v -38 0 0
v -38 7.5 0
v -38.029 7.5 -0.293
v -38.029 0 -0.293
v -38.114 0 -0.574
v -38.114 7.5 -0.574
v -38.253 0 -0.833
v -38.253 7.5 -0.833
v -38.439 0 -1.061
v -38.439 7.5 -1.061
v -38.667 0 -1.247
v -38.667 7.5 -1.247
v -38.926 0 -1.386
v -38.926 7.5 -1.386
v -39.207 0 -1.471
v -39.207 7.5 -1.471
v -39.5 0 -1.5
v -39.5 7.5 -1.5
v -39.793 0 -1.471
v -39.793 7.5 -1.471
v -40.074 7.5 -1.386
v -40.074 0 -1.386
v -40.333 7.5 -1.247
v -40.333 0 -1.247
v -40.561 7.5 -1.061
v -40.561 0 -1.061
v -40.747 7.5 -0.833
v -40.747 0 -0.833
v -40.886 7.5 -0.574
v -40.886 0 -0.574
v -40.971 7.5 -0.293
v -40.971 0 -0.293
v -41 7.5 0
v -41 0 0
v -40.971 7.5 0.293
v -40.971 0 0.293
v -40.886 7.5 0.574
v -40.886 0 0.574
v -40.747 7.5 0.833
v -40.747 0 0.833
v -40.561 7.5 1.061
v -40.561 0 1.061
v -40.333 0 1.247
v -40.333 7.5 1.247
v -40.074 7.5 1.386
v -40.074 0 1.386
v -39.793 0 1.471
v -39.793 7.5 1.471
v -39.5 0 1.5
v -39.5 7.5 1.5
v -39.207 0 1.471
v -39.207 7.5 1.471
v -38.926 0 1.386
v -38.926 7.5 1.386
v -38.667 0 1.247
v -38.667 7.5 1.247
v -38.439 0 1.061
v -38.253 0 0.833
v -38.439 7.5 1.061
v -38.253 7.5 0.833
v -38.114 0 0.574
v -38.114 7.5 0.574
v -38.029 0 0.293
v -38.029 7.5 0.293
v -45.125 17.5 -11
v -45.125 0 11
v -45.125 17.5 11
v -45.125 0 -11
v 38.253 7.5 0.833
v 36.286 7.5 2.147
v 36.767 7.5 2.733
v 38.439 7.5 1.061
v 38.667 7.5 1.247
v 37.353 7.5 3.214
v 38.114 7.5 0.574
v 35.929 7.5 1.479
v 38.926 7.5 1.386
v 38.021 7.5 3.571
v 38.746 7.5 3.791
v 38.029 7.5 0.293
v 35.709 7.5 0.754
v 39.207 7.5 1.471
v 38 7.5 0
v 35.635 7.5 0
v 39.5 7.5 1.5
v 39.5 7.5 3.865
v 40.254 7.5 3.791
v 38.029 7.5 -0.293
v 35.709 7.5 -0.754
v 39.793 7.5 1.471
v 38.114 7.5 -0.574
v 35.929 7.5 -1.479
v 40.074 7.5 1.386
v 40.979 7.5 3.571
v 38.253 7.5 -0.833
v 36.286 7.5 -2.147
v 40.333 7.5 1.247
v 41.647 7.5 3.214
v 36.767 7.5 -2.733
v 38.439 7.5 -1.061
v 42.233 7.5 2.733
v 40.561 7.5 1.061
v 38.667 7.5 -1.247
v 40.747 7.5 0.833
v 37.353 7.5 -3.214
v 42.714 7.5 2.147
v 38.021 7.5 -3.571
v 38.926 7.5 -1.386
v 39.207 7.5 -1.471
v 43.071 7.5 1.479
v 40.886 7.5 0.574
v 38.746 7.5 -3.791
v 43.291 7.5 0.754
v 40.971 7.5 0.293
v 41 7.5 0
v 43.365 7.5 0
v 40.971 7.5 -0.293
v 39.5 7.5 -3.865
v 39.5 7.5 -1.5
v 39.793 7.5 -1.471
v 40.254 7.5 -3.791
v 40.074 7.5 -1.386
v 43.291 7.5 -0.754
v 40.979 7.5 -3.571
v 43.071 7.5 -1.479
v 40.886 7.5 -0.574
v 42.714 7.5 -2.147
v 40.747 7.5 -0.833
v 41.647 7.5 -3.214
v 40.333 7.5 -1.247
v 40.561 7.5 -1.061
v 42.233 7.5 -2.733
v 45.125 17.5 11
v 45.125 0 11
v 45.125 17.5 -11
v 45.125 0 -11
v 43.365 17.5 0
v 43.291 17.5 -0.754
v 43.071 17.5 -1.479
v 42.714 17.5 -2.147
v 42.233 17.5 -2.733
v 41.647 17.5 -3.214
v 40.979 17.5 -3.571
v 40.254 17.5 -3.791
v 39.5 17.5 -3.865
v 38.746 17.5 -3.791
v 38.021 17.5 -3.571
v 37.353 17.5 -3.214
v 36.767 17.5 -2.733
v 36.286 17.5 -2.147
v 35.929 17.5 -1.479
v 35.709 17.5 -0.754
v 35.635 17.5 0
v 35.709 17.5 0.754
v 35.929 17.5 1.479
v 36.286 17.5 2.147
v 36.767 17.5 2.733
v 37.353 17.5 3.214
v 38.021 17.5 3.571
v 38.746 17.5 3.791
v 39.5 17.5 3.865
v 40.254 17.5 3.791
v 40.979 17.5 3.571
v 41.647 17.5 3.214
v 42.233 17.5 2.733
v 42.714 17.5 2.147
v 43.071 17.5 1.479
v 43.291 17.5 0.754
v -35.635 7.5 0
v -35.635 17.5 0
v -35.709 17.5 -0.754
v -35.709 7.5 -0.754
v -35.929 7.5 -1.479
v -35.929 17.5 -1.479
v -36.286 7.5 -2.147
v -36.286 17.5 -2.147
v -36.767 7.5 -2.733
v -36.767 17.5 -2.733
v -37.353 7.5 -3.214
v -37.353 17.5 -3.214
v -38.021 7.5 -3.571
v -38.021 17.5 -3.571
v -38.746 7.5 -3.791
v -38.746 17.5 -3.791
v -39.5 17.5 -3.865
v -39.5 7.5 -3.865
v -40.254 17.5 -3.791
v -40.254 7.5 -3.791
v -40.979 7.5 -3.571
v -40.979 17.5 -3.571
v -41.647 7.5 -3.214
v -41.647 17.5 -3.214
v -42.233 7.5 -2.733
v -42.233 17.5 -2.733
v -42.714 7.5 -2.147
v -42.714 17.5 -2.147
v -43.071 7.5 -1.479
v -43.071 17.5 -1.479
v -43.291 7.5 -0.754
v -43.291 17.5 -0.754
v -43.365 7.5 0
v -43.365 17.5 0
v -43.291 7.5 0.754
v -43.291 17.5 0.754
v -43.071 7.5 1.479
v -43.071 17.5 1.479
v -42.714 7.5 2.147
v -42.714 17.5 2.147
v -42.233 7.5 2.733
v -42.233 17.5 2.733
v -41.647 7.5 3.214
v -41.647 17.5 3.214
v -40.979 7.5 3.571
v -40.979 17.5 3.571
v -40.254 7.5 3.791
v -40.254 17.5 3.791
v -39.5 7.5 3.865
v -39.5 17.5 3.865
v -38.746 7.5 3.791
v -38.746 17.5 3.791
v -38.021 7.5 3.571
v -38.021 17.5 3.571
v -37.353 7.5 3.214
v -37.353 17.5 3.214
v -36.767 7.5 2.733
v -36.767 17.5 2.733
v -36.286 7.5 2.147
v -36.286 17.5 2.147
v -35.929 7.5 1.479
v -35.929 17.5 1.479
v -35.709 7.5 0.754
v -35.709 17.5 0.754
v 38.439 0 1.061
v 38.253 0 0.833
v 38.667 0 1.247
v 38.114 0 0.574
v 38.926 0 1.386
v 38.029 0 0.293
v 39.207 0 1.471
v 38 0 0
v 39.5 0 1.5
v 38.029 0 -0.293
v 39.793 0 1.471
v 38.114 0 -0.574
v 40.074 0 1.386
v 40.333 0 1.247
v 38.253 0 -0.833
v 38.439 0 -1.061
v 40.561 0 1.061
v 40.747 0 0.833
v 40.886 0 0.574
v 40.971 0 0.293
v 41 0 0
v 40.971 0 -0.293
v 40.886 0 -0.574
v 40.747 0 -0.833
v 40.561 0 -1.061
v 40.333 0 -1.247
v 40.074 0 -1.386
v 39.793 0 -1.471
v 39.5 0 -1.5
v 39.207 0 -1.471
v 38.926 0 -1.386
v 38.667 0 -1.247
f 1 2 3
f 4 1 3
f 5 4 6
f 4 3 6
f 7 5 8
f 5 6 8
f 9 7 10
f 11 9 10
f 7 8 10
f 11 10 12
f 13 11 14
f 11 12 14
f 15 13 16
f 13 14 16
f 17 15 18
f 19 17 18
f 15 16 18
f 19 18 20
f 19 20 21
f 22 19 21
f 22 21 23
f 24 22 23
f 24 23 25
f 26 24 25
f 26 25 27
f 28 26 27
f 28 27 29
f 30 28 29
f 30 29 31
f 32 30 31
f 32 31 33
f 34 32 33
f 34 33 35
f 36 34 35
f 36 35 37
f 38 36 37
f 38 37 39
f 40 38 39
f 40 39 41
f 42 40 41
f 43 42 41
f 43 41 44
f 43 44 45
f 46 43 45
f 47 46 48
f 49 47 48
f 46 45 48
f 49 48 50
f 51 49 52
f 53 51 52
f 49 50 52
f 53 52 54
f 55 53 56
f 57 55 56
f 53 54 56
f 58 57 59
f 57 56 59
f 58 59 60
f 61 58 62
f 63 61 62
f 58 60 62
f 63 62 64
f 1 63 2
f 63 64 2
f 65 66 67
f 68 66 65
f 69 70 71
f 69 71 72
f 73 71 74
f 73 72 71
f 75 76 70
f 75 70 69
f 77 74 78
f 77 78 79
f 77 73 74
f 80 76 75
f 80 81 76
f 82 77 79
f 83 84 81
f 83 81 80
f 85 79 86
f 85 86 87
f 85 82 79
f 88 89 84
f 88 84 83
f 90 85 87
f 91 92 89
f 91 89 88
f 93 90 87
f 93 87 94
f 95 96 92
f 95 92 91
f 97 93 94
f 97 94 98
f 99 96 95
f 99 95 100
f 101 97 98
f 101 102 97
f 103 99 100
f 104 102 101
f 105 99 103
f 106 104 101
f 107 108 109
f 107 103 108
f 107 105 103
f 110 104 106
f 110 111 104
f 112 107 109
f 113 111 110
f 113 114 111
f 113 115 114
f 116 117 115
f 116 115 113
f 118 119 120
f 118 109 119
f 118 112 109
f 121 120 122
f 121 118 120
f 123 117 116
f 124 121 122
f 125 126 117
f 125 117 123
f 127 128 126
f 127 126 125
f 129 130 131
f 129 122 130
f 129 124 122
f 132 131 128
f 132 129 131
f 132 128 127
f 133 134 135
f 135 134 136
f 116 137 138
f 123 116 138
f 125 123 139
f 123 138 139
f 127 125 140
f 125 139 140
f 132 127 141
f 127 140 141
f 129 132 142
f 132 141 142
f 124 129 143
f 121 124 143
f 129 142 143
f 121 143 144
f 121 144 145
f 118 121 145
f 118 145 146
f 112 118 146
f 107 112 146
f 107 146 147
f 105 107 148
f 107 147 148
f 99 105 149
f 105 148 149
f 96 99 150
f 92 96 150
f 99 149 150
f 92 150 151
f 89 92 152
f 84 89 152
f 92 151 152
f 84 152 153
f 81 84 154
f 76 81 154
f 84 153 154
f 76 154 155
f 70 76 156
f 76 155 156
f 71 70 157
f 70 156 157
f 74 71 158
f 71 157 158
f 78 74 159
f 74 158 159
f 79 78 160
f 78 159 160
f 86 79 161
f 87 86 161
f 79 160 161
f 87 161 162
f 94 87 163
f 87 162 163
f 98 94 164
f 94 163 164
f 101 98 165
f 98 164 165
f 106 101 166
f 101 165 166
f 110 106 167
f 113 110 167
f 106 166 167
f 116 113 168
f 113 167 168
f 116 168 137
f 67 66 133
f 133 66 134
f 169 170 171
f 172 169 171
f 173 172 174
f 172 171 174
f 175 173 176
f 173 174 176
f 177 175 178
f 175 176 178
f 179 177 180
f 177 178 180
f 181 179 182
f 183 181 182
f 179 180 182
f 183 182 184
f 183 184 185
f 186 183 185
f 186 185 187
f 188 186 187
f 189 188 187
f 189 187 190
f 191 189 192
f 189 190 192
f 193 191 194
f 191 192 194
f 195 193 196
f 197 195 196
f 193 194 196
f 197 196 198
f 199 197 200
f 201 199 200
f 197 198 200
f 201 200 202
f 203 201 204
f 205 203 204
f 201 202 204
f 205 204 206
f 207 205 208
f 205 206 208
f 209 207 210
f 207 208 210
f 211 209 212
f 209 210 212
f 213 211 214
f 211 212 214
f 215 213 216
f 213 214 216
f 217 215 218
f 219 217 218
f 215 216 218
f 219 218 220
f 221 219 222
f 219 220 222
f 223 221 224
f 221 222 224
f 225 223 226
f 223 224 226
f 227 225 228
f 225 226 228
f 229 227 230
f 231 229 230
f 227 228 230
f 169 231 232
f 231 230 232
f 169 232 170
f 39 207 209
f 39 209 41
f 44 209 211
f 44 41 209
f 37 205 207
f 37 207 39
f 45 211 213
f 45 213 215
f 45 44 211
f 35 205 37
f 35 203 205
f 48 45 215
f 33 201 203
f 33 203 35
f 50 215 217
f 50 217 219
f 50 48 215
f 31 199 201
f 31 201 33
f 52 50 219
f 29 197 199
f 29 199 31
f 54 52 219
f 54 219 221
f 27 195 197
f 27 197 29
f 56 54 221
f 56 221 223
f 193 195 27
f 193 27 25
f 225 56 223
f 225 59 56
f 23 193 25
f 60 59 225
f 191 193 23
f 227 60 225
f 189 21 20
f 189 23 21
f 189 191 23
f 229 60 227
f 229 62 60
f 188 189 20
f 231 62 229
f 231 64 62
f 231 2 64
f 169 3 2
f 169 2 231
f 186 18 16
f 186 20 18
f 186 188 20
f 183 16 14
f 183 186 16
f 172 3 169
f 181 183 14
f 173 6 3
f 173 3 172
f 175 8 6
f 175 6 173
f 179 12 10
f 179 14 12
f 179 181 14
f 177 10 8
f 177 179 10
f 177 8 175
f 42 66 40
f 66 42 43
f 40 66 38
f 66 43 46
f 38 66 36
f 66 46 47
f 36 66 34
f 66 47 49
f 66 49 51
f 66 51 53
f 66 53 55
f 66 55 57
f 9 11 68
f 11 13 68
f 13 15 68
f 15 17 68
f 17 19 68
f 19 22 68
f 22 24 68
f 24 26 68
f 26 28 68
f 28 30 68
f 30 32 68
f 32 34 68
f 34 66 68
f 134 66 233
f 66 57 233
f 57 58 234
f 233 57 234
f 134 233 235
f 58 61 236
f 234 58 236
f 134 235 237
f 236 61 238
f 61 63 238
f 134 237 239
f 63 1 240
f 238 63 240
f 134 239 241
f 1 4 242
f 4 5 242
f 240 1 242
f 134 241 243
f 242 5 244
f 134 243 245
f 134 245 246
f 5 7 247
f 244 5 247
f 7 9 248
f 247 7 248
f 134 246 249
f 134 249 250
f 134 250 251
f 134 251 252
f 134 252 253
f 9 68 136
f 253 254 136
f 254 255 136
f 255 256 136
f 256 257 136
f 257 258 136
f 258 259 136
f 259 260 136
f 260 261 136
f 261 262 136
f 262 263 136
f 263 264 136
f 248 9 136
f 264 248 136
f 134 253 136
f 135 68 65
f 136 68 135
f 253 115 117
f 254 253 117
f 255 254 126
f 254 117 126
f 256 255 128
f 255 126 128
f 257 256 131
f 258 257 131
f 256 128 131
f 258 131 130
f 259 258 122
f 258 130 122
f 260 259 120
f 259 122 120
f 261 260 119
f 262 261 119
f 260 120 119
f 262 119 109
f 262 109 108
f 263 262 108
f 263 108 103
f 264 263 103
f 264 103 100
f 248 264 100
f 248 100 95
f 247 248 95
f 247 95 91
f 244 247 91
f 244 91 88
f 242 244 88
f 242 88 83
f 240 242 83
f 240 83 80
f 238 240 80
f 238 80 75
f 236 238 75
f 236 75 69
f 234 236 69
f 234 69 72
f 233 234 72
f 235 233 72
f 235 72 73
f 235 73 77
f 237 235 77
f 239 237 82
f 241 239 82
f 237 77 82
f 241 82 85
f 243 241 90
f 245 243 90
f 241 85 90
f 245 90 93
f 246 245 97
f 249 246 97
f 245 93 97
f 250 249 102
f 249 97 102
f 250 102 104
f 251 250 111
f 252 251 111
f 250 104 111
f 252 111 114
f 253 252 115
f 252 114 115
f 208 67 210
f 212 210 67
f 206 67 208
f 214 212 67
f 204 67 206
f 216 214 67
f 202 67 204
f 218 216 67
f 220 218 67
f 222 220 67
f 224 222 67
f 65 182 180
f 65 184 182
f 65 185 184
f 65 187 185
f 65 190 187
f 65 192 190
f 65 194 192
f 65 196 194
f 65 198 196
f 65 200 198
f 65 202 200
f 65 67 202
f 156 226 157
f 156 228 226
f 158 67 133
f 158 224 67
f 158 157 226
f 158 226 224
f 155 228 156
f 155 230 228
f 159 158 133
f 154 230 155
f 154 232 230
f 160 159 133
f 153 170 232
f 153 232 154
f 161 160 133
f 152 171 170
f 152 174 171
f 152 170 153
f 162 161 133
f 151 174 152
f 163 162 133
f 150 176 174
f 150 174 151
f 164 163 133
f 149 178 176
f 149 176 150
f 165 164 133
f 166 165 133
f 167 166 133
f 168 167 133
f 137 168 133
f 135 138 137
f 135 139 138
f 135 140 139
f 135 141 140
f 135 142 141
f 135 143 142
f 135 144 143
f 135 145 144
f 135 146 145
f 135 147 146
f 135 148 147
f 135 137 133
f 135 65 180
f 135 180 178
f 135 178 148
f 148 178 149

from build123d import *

# Parameters (mm, degrees)
SKETCH1_W               = 90.25
SKETCH1_H               = 22
BOSS_EXTRUDE1_DEPTH     = 17.5
SKETCH2_R               = 1.5
CUT_EXTRUDE1_DEPTH      = 1
CUT_EXTRUDE1_DEPTH_BACK = 18.5
SKETCH3_R               = 3.865
SKETCH3_R_2             = 1.5
CUT_EXTRUDE2_DEPTH      = 10


with BuildPart() as part:
    # Sketch1 → Boss-Extrude1 (new body)
    with BuildSketch(Plane(origin=(0, 0, 0), x_dir=(1, 0, 0), z_dir=(0, 1, 0))):
        Rectangle(SKETCH1_W, SKETCH1_H)
    extrude(amount=BOSS_EXTRUDE1_DEPTH)

    # Sketch2 → Cut-Extrude1 (cut, two sides)
    with BuildSketch(Plane(origin=(0, 17.5, 0), x_dir=(1, 0, 0), z_dir=(0, 1, 0))) as cut_extrude1_sk:
        with Locations((-39.5, 0)):
            Circle(SKETCH2_R)
        with Locations((39.5, 0)):
            Circle(SKETCH2_R)
    extrude(amount=CUT_EXTRUDE1_DEPTH, mode=Mode.SUBTRACT)
    extrude(cut_extrude1_sk.sketch, amount=-CUT_EXTRUDE1_DEPTH_BACK, mode=Mode.SUBTRACT)

    # Sketch3 → Cut-Extrude2 (cut)
    with BuildSketch(Plane(origin=(0, 17.5, 0), x_dir=(1, 0, 0), z_dir=(0, 1, 0))):
        with Locations((-39.5, 0)):
            Circle(SKETCH3_R)
        with Locations((-39.5, 0)):
            Circle(SKETCH3_R_2, mode=Mode.SUBTRACT)
        with Locations((39.5, 0)):
            Circle(SKETCH3_R)
        with Locations((39.5, 0)):
            Circle(SKETCH3_R_2, mode=Mode.SUBTRACT)
    extrude(amount=-CUT_EXTRUDE2_DEPTH, mode=Mode.SUBTRACT)


solid = part.part
